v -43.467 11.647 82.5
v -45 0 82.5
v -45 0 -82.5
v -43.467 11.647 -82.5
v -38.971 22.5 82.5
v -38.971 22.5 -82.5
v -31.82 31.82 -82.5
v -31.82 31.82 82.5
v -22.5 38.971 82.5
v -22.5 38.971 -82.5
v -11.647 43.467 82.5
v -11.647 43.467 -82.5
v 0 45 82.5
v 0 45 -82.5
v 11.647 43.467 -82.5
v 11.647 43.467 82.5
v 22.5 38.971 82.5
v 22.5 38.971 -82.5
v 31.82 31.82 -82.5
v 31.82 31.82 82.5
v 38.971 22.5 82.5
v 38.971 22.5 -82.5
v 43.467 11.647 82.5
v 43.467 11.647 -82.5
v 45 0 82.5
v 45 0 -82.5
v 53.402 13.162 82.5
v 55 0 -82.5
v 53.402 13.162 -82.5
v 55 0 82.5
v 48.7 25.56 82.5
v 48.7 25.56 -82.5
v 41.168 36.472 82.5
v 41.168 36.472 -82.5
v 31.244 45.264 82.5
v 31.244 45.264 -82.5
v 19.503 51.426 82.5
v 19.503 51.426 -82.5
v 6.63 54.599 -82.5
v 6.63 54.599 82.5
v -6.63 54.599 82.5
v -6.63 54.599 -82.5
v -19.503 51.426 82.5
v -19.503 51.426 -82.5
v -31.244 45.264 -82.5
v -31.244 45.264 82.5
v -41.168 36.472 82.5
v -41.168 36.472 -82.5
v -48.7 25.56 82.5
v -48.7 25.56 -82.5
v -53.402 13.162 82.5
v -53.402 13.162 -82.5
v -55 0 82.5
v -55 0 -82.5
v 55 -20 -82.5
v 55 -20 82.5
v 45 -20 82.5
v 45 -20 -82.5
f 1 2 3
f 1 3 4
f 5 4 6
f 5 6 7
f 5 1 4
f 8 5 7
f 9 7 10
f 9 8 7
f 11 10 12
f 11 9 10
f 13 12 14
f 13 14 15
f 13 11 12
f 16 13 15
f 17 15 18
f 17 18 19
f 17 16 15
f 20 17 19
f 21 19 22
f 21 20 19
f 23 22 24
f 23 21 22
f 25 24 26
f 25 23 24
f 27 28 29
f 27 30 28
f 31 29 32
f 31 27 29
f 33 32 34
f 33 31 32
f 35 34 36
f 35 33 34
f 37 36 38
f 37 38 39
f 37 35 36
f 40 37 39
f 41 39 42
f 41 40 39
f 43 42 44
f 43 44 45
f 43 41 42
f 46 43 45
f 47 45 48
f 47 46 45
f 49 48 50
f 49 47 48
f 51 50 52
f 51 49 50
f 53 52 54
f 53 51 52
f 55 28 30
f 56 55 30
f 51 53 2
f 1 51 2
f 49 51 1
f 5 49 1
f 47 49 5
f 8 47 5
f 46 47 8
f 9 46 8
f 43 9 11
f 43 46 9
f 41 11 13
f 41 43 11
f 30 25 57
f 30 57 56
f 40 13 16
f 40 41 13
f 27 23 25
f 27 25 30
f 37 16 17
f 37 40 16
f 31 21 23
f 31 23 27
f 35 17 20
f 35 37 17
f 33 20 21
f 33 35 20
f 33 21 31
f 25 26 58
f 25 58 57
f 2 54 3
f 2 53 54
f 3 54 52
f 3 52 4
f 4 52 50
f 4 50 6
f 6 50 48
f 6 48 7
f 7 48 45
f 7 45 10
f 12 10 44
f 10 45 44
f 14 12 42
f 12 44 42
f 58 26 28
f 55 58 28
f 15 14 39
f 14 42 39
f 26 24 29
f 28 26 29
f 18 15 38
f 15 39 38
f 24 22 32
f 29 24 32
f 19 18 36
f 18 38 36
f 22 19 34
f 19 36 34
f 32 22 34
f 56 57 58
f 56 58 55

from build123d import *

# Parameters (mm, degrees)
BOSS_EXTRUDE1_DEPTH = 82.5
SKETCH3_W           = 10
SKETCH3_H           = 165
BOSS_EXTRUDE2_DEPTH = 20


with BuildPart() as part:
    # Sketch2 → Boss-Extrude1 (new body, symmetric)
    with BuildSketch(Plane.XY):
        with BuildLine():
            Line((-55, 0), (-45, 0))
            ThreePointArc((-45, 0), (0, 45), (45, 0))
            Line((45, 0), (55, 0))
            ThreePointArc((55, 0), (0, 55), (-55, 0))
        make_face()
    extrude(amount=BOSS_EXTRUDE1_DEPTH, both=True)

    # Sketch3 → Boss-Extrude2 (add)
    with BuildSketch(Plane.XZ):
        with Locations((50, 0)):
            Rectangle(SKETCH3_W, SKETCH3_H)
    extrude(amount=BOSS_EXTRUDE2_DEPTH)


solid = part.part
